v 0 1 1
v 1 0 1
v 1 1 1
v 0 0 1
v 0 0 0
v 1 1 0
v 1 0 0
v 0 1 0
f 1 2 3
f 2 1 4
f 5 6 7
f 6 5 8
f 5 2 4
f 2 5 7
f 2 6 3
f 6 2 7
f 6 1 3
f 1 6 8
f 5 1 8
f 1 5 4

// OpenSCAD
// string searches

simpleSearch1=search("a","abcdabcd");
echo(str("Characters in string (\"a\"): ",simpleSearch1));

simpleSearch2=search("adeq","abcdeabcd",0);
echo(str("Characters in string (\"adeq\"): ",simpleSearch2));

sTable1=[ ["a",1],["b",2],["c",3],["d",4],["a",5],["b",6],["c",7],["d",8],["e",9] ];
s1= search("abe",sTable1);
echo(str("Default string search (\"abe\"): ",s1));

sTable2=[ ["a",1],["b",2],["c",3],["d",4],["a",5],["b",6],["c",7],["d",8],["e",9],["a",10],["a",11] ];
s2= search("abe",sTable2,0);
echo(str("Return all matches for string search (\"abe\"): ",s2));

sTable3=[ ["a",1],["b",2],["c",3],["d",4],["a",5],["b",6],["c",7],["d",8],["e",9],["a",10],["a",11] ];
s3= search("abe",sTable3,2);
echo(str("Return up to 2 matches for string search (\"abe\"): ",s3));

sTable4=[ [1,"a",[20]],[2,"b",21],[3,"c",22],[4,"d",23],[5,"a",24],[6,"b",25],[7,"c",26],[8,"d",27],[9,"e",28],[10,"a",29],[11,"a",30] ];
s4= search("aebe",sTable4,2,1);
echo(str("Return up to 2 matches for string search; alternate columns (\"aebe\"): ",s4));

// s5= search("abe",sTable4,2,1,3); // bounds checking needs fixing.
// echo(str("Return up to 2 matches for string search; alternate columns: ",s4));

// Value searches
vTable1=[1,2,3];
v1 = search(3, vTable1);
echo(str("Default value search (3): ", v1));
vTable1=[1,2,3];
v2 = search(4, vTable1);
echo(str("Value not found (4): ", v2));
vTable2=[[0,1],[1,2],[2,3]];
v3 = search([[1,2]], vTable2);
echo(str("Value vector ([1,2]): ", v3));

// number searches
nTable1=[ [1,"a"],[3,"b"],[2,"c"],[4,"d"],[1,"a"],[7,"b"],[2,"c"],[8,"d"],[9,"e"],[10,"a"],[1,"a"] ];
n1 = search(7,nTable1);
echo(str("Default number search (7): ",n1));
n2 = search(1,nTable1,0);
echo(str("Return all matches for number search (1): ",n2));
n3 = search(1,nTable1,2);
echo(str("Return up to 2 matches for number search (1): ",n3));

// list searches
lTable1=[ [1,"a"],[3,"b"],[2,"c"],[4,"d"],[1,"a"],[7,"b"],[2,"c"],[8,"d"],[9,"e"],[10,"a"],[1,"a"] ];
lSearch1=[1,3,1000];
l1=search(lSearch1,lTable1);
echo(str("Default list number search (",lSearch1,"): ",l1));

lTable2=[ ["cat",1],["b",2],["c",3],["dog",4],["a",5],["b",6],["c",7],["d",8],["e",9],["apple",10],["a",11] ];
lSearch2=["b","zzz","a","c","apple","dog"];
l2=search(lSearch2,lTable2);
echo(str("Default list string search (",lSearch2,"): ",l2));

lTable3=[ ["cat",1],["b",2],["c",3],[4,"dog"],["a",5],["b",6],["c",7],["d",8],["e",9],["apple",10],["a",11] ];
lSearch3=["b",4,"zzz","c","apple",500,"a",""];
l3=search(lSearch3,lTable3);
echo(str("Default list mixed search (",lSearch3,"): ",l3));

l4=search(lSearch3,lTable3,0);
echo(str("Return all matches for mixed search (",lSearch3,"): ",l4));

lSearch5=[1,"zz","dog",500,11];
l5=search(lSearch5,lTable3,0,1);
echo(str("Return all matches for mixed search; alternate columns (",lSearch5,"): ",l5));

// causing warnings
lTable6=[ ["a",1],123 ];
echo(search("a", lTable6, num_returns_per_match=0)); 

lTable7=[ ["a",1],"string" ];
echo(search("a", lTable7, num_returns_per_match=0)); 

lTable8=[ ["b",1] ];
echo(search("a", lTable8, num_returns_per_match=0)); 

lTable9=[ ["a",1] ];
echo(search("abcd", lTable9, num_returns_per_match=0)); 

// for completeness
cube(1.0);
